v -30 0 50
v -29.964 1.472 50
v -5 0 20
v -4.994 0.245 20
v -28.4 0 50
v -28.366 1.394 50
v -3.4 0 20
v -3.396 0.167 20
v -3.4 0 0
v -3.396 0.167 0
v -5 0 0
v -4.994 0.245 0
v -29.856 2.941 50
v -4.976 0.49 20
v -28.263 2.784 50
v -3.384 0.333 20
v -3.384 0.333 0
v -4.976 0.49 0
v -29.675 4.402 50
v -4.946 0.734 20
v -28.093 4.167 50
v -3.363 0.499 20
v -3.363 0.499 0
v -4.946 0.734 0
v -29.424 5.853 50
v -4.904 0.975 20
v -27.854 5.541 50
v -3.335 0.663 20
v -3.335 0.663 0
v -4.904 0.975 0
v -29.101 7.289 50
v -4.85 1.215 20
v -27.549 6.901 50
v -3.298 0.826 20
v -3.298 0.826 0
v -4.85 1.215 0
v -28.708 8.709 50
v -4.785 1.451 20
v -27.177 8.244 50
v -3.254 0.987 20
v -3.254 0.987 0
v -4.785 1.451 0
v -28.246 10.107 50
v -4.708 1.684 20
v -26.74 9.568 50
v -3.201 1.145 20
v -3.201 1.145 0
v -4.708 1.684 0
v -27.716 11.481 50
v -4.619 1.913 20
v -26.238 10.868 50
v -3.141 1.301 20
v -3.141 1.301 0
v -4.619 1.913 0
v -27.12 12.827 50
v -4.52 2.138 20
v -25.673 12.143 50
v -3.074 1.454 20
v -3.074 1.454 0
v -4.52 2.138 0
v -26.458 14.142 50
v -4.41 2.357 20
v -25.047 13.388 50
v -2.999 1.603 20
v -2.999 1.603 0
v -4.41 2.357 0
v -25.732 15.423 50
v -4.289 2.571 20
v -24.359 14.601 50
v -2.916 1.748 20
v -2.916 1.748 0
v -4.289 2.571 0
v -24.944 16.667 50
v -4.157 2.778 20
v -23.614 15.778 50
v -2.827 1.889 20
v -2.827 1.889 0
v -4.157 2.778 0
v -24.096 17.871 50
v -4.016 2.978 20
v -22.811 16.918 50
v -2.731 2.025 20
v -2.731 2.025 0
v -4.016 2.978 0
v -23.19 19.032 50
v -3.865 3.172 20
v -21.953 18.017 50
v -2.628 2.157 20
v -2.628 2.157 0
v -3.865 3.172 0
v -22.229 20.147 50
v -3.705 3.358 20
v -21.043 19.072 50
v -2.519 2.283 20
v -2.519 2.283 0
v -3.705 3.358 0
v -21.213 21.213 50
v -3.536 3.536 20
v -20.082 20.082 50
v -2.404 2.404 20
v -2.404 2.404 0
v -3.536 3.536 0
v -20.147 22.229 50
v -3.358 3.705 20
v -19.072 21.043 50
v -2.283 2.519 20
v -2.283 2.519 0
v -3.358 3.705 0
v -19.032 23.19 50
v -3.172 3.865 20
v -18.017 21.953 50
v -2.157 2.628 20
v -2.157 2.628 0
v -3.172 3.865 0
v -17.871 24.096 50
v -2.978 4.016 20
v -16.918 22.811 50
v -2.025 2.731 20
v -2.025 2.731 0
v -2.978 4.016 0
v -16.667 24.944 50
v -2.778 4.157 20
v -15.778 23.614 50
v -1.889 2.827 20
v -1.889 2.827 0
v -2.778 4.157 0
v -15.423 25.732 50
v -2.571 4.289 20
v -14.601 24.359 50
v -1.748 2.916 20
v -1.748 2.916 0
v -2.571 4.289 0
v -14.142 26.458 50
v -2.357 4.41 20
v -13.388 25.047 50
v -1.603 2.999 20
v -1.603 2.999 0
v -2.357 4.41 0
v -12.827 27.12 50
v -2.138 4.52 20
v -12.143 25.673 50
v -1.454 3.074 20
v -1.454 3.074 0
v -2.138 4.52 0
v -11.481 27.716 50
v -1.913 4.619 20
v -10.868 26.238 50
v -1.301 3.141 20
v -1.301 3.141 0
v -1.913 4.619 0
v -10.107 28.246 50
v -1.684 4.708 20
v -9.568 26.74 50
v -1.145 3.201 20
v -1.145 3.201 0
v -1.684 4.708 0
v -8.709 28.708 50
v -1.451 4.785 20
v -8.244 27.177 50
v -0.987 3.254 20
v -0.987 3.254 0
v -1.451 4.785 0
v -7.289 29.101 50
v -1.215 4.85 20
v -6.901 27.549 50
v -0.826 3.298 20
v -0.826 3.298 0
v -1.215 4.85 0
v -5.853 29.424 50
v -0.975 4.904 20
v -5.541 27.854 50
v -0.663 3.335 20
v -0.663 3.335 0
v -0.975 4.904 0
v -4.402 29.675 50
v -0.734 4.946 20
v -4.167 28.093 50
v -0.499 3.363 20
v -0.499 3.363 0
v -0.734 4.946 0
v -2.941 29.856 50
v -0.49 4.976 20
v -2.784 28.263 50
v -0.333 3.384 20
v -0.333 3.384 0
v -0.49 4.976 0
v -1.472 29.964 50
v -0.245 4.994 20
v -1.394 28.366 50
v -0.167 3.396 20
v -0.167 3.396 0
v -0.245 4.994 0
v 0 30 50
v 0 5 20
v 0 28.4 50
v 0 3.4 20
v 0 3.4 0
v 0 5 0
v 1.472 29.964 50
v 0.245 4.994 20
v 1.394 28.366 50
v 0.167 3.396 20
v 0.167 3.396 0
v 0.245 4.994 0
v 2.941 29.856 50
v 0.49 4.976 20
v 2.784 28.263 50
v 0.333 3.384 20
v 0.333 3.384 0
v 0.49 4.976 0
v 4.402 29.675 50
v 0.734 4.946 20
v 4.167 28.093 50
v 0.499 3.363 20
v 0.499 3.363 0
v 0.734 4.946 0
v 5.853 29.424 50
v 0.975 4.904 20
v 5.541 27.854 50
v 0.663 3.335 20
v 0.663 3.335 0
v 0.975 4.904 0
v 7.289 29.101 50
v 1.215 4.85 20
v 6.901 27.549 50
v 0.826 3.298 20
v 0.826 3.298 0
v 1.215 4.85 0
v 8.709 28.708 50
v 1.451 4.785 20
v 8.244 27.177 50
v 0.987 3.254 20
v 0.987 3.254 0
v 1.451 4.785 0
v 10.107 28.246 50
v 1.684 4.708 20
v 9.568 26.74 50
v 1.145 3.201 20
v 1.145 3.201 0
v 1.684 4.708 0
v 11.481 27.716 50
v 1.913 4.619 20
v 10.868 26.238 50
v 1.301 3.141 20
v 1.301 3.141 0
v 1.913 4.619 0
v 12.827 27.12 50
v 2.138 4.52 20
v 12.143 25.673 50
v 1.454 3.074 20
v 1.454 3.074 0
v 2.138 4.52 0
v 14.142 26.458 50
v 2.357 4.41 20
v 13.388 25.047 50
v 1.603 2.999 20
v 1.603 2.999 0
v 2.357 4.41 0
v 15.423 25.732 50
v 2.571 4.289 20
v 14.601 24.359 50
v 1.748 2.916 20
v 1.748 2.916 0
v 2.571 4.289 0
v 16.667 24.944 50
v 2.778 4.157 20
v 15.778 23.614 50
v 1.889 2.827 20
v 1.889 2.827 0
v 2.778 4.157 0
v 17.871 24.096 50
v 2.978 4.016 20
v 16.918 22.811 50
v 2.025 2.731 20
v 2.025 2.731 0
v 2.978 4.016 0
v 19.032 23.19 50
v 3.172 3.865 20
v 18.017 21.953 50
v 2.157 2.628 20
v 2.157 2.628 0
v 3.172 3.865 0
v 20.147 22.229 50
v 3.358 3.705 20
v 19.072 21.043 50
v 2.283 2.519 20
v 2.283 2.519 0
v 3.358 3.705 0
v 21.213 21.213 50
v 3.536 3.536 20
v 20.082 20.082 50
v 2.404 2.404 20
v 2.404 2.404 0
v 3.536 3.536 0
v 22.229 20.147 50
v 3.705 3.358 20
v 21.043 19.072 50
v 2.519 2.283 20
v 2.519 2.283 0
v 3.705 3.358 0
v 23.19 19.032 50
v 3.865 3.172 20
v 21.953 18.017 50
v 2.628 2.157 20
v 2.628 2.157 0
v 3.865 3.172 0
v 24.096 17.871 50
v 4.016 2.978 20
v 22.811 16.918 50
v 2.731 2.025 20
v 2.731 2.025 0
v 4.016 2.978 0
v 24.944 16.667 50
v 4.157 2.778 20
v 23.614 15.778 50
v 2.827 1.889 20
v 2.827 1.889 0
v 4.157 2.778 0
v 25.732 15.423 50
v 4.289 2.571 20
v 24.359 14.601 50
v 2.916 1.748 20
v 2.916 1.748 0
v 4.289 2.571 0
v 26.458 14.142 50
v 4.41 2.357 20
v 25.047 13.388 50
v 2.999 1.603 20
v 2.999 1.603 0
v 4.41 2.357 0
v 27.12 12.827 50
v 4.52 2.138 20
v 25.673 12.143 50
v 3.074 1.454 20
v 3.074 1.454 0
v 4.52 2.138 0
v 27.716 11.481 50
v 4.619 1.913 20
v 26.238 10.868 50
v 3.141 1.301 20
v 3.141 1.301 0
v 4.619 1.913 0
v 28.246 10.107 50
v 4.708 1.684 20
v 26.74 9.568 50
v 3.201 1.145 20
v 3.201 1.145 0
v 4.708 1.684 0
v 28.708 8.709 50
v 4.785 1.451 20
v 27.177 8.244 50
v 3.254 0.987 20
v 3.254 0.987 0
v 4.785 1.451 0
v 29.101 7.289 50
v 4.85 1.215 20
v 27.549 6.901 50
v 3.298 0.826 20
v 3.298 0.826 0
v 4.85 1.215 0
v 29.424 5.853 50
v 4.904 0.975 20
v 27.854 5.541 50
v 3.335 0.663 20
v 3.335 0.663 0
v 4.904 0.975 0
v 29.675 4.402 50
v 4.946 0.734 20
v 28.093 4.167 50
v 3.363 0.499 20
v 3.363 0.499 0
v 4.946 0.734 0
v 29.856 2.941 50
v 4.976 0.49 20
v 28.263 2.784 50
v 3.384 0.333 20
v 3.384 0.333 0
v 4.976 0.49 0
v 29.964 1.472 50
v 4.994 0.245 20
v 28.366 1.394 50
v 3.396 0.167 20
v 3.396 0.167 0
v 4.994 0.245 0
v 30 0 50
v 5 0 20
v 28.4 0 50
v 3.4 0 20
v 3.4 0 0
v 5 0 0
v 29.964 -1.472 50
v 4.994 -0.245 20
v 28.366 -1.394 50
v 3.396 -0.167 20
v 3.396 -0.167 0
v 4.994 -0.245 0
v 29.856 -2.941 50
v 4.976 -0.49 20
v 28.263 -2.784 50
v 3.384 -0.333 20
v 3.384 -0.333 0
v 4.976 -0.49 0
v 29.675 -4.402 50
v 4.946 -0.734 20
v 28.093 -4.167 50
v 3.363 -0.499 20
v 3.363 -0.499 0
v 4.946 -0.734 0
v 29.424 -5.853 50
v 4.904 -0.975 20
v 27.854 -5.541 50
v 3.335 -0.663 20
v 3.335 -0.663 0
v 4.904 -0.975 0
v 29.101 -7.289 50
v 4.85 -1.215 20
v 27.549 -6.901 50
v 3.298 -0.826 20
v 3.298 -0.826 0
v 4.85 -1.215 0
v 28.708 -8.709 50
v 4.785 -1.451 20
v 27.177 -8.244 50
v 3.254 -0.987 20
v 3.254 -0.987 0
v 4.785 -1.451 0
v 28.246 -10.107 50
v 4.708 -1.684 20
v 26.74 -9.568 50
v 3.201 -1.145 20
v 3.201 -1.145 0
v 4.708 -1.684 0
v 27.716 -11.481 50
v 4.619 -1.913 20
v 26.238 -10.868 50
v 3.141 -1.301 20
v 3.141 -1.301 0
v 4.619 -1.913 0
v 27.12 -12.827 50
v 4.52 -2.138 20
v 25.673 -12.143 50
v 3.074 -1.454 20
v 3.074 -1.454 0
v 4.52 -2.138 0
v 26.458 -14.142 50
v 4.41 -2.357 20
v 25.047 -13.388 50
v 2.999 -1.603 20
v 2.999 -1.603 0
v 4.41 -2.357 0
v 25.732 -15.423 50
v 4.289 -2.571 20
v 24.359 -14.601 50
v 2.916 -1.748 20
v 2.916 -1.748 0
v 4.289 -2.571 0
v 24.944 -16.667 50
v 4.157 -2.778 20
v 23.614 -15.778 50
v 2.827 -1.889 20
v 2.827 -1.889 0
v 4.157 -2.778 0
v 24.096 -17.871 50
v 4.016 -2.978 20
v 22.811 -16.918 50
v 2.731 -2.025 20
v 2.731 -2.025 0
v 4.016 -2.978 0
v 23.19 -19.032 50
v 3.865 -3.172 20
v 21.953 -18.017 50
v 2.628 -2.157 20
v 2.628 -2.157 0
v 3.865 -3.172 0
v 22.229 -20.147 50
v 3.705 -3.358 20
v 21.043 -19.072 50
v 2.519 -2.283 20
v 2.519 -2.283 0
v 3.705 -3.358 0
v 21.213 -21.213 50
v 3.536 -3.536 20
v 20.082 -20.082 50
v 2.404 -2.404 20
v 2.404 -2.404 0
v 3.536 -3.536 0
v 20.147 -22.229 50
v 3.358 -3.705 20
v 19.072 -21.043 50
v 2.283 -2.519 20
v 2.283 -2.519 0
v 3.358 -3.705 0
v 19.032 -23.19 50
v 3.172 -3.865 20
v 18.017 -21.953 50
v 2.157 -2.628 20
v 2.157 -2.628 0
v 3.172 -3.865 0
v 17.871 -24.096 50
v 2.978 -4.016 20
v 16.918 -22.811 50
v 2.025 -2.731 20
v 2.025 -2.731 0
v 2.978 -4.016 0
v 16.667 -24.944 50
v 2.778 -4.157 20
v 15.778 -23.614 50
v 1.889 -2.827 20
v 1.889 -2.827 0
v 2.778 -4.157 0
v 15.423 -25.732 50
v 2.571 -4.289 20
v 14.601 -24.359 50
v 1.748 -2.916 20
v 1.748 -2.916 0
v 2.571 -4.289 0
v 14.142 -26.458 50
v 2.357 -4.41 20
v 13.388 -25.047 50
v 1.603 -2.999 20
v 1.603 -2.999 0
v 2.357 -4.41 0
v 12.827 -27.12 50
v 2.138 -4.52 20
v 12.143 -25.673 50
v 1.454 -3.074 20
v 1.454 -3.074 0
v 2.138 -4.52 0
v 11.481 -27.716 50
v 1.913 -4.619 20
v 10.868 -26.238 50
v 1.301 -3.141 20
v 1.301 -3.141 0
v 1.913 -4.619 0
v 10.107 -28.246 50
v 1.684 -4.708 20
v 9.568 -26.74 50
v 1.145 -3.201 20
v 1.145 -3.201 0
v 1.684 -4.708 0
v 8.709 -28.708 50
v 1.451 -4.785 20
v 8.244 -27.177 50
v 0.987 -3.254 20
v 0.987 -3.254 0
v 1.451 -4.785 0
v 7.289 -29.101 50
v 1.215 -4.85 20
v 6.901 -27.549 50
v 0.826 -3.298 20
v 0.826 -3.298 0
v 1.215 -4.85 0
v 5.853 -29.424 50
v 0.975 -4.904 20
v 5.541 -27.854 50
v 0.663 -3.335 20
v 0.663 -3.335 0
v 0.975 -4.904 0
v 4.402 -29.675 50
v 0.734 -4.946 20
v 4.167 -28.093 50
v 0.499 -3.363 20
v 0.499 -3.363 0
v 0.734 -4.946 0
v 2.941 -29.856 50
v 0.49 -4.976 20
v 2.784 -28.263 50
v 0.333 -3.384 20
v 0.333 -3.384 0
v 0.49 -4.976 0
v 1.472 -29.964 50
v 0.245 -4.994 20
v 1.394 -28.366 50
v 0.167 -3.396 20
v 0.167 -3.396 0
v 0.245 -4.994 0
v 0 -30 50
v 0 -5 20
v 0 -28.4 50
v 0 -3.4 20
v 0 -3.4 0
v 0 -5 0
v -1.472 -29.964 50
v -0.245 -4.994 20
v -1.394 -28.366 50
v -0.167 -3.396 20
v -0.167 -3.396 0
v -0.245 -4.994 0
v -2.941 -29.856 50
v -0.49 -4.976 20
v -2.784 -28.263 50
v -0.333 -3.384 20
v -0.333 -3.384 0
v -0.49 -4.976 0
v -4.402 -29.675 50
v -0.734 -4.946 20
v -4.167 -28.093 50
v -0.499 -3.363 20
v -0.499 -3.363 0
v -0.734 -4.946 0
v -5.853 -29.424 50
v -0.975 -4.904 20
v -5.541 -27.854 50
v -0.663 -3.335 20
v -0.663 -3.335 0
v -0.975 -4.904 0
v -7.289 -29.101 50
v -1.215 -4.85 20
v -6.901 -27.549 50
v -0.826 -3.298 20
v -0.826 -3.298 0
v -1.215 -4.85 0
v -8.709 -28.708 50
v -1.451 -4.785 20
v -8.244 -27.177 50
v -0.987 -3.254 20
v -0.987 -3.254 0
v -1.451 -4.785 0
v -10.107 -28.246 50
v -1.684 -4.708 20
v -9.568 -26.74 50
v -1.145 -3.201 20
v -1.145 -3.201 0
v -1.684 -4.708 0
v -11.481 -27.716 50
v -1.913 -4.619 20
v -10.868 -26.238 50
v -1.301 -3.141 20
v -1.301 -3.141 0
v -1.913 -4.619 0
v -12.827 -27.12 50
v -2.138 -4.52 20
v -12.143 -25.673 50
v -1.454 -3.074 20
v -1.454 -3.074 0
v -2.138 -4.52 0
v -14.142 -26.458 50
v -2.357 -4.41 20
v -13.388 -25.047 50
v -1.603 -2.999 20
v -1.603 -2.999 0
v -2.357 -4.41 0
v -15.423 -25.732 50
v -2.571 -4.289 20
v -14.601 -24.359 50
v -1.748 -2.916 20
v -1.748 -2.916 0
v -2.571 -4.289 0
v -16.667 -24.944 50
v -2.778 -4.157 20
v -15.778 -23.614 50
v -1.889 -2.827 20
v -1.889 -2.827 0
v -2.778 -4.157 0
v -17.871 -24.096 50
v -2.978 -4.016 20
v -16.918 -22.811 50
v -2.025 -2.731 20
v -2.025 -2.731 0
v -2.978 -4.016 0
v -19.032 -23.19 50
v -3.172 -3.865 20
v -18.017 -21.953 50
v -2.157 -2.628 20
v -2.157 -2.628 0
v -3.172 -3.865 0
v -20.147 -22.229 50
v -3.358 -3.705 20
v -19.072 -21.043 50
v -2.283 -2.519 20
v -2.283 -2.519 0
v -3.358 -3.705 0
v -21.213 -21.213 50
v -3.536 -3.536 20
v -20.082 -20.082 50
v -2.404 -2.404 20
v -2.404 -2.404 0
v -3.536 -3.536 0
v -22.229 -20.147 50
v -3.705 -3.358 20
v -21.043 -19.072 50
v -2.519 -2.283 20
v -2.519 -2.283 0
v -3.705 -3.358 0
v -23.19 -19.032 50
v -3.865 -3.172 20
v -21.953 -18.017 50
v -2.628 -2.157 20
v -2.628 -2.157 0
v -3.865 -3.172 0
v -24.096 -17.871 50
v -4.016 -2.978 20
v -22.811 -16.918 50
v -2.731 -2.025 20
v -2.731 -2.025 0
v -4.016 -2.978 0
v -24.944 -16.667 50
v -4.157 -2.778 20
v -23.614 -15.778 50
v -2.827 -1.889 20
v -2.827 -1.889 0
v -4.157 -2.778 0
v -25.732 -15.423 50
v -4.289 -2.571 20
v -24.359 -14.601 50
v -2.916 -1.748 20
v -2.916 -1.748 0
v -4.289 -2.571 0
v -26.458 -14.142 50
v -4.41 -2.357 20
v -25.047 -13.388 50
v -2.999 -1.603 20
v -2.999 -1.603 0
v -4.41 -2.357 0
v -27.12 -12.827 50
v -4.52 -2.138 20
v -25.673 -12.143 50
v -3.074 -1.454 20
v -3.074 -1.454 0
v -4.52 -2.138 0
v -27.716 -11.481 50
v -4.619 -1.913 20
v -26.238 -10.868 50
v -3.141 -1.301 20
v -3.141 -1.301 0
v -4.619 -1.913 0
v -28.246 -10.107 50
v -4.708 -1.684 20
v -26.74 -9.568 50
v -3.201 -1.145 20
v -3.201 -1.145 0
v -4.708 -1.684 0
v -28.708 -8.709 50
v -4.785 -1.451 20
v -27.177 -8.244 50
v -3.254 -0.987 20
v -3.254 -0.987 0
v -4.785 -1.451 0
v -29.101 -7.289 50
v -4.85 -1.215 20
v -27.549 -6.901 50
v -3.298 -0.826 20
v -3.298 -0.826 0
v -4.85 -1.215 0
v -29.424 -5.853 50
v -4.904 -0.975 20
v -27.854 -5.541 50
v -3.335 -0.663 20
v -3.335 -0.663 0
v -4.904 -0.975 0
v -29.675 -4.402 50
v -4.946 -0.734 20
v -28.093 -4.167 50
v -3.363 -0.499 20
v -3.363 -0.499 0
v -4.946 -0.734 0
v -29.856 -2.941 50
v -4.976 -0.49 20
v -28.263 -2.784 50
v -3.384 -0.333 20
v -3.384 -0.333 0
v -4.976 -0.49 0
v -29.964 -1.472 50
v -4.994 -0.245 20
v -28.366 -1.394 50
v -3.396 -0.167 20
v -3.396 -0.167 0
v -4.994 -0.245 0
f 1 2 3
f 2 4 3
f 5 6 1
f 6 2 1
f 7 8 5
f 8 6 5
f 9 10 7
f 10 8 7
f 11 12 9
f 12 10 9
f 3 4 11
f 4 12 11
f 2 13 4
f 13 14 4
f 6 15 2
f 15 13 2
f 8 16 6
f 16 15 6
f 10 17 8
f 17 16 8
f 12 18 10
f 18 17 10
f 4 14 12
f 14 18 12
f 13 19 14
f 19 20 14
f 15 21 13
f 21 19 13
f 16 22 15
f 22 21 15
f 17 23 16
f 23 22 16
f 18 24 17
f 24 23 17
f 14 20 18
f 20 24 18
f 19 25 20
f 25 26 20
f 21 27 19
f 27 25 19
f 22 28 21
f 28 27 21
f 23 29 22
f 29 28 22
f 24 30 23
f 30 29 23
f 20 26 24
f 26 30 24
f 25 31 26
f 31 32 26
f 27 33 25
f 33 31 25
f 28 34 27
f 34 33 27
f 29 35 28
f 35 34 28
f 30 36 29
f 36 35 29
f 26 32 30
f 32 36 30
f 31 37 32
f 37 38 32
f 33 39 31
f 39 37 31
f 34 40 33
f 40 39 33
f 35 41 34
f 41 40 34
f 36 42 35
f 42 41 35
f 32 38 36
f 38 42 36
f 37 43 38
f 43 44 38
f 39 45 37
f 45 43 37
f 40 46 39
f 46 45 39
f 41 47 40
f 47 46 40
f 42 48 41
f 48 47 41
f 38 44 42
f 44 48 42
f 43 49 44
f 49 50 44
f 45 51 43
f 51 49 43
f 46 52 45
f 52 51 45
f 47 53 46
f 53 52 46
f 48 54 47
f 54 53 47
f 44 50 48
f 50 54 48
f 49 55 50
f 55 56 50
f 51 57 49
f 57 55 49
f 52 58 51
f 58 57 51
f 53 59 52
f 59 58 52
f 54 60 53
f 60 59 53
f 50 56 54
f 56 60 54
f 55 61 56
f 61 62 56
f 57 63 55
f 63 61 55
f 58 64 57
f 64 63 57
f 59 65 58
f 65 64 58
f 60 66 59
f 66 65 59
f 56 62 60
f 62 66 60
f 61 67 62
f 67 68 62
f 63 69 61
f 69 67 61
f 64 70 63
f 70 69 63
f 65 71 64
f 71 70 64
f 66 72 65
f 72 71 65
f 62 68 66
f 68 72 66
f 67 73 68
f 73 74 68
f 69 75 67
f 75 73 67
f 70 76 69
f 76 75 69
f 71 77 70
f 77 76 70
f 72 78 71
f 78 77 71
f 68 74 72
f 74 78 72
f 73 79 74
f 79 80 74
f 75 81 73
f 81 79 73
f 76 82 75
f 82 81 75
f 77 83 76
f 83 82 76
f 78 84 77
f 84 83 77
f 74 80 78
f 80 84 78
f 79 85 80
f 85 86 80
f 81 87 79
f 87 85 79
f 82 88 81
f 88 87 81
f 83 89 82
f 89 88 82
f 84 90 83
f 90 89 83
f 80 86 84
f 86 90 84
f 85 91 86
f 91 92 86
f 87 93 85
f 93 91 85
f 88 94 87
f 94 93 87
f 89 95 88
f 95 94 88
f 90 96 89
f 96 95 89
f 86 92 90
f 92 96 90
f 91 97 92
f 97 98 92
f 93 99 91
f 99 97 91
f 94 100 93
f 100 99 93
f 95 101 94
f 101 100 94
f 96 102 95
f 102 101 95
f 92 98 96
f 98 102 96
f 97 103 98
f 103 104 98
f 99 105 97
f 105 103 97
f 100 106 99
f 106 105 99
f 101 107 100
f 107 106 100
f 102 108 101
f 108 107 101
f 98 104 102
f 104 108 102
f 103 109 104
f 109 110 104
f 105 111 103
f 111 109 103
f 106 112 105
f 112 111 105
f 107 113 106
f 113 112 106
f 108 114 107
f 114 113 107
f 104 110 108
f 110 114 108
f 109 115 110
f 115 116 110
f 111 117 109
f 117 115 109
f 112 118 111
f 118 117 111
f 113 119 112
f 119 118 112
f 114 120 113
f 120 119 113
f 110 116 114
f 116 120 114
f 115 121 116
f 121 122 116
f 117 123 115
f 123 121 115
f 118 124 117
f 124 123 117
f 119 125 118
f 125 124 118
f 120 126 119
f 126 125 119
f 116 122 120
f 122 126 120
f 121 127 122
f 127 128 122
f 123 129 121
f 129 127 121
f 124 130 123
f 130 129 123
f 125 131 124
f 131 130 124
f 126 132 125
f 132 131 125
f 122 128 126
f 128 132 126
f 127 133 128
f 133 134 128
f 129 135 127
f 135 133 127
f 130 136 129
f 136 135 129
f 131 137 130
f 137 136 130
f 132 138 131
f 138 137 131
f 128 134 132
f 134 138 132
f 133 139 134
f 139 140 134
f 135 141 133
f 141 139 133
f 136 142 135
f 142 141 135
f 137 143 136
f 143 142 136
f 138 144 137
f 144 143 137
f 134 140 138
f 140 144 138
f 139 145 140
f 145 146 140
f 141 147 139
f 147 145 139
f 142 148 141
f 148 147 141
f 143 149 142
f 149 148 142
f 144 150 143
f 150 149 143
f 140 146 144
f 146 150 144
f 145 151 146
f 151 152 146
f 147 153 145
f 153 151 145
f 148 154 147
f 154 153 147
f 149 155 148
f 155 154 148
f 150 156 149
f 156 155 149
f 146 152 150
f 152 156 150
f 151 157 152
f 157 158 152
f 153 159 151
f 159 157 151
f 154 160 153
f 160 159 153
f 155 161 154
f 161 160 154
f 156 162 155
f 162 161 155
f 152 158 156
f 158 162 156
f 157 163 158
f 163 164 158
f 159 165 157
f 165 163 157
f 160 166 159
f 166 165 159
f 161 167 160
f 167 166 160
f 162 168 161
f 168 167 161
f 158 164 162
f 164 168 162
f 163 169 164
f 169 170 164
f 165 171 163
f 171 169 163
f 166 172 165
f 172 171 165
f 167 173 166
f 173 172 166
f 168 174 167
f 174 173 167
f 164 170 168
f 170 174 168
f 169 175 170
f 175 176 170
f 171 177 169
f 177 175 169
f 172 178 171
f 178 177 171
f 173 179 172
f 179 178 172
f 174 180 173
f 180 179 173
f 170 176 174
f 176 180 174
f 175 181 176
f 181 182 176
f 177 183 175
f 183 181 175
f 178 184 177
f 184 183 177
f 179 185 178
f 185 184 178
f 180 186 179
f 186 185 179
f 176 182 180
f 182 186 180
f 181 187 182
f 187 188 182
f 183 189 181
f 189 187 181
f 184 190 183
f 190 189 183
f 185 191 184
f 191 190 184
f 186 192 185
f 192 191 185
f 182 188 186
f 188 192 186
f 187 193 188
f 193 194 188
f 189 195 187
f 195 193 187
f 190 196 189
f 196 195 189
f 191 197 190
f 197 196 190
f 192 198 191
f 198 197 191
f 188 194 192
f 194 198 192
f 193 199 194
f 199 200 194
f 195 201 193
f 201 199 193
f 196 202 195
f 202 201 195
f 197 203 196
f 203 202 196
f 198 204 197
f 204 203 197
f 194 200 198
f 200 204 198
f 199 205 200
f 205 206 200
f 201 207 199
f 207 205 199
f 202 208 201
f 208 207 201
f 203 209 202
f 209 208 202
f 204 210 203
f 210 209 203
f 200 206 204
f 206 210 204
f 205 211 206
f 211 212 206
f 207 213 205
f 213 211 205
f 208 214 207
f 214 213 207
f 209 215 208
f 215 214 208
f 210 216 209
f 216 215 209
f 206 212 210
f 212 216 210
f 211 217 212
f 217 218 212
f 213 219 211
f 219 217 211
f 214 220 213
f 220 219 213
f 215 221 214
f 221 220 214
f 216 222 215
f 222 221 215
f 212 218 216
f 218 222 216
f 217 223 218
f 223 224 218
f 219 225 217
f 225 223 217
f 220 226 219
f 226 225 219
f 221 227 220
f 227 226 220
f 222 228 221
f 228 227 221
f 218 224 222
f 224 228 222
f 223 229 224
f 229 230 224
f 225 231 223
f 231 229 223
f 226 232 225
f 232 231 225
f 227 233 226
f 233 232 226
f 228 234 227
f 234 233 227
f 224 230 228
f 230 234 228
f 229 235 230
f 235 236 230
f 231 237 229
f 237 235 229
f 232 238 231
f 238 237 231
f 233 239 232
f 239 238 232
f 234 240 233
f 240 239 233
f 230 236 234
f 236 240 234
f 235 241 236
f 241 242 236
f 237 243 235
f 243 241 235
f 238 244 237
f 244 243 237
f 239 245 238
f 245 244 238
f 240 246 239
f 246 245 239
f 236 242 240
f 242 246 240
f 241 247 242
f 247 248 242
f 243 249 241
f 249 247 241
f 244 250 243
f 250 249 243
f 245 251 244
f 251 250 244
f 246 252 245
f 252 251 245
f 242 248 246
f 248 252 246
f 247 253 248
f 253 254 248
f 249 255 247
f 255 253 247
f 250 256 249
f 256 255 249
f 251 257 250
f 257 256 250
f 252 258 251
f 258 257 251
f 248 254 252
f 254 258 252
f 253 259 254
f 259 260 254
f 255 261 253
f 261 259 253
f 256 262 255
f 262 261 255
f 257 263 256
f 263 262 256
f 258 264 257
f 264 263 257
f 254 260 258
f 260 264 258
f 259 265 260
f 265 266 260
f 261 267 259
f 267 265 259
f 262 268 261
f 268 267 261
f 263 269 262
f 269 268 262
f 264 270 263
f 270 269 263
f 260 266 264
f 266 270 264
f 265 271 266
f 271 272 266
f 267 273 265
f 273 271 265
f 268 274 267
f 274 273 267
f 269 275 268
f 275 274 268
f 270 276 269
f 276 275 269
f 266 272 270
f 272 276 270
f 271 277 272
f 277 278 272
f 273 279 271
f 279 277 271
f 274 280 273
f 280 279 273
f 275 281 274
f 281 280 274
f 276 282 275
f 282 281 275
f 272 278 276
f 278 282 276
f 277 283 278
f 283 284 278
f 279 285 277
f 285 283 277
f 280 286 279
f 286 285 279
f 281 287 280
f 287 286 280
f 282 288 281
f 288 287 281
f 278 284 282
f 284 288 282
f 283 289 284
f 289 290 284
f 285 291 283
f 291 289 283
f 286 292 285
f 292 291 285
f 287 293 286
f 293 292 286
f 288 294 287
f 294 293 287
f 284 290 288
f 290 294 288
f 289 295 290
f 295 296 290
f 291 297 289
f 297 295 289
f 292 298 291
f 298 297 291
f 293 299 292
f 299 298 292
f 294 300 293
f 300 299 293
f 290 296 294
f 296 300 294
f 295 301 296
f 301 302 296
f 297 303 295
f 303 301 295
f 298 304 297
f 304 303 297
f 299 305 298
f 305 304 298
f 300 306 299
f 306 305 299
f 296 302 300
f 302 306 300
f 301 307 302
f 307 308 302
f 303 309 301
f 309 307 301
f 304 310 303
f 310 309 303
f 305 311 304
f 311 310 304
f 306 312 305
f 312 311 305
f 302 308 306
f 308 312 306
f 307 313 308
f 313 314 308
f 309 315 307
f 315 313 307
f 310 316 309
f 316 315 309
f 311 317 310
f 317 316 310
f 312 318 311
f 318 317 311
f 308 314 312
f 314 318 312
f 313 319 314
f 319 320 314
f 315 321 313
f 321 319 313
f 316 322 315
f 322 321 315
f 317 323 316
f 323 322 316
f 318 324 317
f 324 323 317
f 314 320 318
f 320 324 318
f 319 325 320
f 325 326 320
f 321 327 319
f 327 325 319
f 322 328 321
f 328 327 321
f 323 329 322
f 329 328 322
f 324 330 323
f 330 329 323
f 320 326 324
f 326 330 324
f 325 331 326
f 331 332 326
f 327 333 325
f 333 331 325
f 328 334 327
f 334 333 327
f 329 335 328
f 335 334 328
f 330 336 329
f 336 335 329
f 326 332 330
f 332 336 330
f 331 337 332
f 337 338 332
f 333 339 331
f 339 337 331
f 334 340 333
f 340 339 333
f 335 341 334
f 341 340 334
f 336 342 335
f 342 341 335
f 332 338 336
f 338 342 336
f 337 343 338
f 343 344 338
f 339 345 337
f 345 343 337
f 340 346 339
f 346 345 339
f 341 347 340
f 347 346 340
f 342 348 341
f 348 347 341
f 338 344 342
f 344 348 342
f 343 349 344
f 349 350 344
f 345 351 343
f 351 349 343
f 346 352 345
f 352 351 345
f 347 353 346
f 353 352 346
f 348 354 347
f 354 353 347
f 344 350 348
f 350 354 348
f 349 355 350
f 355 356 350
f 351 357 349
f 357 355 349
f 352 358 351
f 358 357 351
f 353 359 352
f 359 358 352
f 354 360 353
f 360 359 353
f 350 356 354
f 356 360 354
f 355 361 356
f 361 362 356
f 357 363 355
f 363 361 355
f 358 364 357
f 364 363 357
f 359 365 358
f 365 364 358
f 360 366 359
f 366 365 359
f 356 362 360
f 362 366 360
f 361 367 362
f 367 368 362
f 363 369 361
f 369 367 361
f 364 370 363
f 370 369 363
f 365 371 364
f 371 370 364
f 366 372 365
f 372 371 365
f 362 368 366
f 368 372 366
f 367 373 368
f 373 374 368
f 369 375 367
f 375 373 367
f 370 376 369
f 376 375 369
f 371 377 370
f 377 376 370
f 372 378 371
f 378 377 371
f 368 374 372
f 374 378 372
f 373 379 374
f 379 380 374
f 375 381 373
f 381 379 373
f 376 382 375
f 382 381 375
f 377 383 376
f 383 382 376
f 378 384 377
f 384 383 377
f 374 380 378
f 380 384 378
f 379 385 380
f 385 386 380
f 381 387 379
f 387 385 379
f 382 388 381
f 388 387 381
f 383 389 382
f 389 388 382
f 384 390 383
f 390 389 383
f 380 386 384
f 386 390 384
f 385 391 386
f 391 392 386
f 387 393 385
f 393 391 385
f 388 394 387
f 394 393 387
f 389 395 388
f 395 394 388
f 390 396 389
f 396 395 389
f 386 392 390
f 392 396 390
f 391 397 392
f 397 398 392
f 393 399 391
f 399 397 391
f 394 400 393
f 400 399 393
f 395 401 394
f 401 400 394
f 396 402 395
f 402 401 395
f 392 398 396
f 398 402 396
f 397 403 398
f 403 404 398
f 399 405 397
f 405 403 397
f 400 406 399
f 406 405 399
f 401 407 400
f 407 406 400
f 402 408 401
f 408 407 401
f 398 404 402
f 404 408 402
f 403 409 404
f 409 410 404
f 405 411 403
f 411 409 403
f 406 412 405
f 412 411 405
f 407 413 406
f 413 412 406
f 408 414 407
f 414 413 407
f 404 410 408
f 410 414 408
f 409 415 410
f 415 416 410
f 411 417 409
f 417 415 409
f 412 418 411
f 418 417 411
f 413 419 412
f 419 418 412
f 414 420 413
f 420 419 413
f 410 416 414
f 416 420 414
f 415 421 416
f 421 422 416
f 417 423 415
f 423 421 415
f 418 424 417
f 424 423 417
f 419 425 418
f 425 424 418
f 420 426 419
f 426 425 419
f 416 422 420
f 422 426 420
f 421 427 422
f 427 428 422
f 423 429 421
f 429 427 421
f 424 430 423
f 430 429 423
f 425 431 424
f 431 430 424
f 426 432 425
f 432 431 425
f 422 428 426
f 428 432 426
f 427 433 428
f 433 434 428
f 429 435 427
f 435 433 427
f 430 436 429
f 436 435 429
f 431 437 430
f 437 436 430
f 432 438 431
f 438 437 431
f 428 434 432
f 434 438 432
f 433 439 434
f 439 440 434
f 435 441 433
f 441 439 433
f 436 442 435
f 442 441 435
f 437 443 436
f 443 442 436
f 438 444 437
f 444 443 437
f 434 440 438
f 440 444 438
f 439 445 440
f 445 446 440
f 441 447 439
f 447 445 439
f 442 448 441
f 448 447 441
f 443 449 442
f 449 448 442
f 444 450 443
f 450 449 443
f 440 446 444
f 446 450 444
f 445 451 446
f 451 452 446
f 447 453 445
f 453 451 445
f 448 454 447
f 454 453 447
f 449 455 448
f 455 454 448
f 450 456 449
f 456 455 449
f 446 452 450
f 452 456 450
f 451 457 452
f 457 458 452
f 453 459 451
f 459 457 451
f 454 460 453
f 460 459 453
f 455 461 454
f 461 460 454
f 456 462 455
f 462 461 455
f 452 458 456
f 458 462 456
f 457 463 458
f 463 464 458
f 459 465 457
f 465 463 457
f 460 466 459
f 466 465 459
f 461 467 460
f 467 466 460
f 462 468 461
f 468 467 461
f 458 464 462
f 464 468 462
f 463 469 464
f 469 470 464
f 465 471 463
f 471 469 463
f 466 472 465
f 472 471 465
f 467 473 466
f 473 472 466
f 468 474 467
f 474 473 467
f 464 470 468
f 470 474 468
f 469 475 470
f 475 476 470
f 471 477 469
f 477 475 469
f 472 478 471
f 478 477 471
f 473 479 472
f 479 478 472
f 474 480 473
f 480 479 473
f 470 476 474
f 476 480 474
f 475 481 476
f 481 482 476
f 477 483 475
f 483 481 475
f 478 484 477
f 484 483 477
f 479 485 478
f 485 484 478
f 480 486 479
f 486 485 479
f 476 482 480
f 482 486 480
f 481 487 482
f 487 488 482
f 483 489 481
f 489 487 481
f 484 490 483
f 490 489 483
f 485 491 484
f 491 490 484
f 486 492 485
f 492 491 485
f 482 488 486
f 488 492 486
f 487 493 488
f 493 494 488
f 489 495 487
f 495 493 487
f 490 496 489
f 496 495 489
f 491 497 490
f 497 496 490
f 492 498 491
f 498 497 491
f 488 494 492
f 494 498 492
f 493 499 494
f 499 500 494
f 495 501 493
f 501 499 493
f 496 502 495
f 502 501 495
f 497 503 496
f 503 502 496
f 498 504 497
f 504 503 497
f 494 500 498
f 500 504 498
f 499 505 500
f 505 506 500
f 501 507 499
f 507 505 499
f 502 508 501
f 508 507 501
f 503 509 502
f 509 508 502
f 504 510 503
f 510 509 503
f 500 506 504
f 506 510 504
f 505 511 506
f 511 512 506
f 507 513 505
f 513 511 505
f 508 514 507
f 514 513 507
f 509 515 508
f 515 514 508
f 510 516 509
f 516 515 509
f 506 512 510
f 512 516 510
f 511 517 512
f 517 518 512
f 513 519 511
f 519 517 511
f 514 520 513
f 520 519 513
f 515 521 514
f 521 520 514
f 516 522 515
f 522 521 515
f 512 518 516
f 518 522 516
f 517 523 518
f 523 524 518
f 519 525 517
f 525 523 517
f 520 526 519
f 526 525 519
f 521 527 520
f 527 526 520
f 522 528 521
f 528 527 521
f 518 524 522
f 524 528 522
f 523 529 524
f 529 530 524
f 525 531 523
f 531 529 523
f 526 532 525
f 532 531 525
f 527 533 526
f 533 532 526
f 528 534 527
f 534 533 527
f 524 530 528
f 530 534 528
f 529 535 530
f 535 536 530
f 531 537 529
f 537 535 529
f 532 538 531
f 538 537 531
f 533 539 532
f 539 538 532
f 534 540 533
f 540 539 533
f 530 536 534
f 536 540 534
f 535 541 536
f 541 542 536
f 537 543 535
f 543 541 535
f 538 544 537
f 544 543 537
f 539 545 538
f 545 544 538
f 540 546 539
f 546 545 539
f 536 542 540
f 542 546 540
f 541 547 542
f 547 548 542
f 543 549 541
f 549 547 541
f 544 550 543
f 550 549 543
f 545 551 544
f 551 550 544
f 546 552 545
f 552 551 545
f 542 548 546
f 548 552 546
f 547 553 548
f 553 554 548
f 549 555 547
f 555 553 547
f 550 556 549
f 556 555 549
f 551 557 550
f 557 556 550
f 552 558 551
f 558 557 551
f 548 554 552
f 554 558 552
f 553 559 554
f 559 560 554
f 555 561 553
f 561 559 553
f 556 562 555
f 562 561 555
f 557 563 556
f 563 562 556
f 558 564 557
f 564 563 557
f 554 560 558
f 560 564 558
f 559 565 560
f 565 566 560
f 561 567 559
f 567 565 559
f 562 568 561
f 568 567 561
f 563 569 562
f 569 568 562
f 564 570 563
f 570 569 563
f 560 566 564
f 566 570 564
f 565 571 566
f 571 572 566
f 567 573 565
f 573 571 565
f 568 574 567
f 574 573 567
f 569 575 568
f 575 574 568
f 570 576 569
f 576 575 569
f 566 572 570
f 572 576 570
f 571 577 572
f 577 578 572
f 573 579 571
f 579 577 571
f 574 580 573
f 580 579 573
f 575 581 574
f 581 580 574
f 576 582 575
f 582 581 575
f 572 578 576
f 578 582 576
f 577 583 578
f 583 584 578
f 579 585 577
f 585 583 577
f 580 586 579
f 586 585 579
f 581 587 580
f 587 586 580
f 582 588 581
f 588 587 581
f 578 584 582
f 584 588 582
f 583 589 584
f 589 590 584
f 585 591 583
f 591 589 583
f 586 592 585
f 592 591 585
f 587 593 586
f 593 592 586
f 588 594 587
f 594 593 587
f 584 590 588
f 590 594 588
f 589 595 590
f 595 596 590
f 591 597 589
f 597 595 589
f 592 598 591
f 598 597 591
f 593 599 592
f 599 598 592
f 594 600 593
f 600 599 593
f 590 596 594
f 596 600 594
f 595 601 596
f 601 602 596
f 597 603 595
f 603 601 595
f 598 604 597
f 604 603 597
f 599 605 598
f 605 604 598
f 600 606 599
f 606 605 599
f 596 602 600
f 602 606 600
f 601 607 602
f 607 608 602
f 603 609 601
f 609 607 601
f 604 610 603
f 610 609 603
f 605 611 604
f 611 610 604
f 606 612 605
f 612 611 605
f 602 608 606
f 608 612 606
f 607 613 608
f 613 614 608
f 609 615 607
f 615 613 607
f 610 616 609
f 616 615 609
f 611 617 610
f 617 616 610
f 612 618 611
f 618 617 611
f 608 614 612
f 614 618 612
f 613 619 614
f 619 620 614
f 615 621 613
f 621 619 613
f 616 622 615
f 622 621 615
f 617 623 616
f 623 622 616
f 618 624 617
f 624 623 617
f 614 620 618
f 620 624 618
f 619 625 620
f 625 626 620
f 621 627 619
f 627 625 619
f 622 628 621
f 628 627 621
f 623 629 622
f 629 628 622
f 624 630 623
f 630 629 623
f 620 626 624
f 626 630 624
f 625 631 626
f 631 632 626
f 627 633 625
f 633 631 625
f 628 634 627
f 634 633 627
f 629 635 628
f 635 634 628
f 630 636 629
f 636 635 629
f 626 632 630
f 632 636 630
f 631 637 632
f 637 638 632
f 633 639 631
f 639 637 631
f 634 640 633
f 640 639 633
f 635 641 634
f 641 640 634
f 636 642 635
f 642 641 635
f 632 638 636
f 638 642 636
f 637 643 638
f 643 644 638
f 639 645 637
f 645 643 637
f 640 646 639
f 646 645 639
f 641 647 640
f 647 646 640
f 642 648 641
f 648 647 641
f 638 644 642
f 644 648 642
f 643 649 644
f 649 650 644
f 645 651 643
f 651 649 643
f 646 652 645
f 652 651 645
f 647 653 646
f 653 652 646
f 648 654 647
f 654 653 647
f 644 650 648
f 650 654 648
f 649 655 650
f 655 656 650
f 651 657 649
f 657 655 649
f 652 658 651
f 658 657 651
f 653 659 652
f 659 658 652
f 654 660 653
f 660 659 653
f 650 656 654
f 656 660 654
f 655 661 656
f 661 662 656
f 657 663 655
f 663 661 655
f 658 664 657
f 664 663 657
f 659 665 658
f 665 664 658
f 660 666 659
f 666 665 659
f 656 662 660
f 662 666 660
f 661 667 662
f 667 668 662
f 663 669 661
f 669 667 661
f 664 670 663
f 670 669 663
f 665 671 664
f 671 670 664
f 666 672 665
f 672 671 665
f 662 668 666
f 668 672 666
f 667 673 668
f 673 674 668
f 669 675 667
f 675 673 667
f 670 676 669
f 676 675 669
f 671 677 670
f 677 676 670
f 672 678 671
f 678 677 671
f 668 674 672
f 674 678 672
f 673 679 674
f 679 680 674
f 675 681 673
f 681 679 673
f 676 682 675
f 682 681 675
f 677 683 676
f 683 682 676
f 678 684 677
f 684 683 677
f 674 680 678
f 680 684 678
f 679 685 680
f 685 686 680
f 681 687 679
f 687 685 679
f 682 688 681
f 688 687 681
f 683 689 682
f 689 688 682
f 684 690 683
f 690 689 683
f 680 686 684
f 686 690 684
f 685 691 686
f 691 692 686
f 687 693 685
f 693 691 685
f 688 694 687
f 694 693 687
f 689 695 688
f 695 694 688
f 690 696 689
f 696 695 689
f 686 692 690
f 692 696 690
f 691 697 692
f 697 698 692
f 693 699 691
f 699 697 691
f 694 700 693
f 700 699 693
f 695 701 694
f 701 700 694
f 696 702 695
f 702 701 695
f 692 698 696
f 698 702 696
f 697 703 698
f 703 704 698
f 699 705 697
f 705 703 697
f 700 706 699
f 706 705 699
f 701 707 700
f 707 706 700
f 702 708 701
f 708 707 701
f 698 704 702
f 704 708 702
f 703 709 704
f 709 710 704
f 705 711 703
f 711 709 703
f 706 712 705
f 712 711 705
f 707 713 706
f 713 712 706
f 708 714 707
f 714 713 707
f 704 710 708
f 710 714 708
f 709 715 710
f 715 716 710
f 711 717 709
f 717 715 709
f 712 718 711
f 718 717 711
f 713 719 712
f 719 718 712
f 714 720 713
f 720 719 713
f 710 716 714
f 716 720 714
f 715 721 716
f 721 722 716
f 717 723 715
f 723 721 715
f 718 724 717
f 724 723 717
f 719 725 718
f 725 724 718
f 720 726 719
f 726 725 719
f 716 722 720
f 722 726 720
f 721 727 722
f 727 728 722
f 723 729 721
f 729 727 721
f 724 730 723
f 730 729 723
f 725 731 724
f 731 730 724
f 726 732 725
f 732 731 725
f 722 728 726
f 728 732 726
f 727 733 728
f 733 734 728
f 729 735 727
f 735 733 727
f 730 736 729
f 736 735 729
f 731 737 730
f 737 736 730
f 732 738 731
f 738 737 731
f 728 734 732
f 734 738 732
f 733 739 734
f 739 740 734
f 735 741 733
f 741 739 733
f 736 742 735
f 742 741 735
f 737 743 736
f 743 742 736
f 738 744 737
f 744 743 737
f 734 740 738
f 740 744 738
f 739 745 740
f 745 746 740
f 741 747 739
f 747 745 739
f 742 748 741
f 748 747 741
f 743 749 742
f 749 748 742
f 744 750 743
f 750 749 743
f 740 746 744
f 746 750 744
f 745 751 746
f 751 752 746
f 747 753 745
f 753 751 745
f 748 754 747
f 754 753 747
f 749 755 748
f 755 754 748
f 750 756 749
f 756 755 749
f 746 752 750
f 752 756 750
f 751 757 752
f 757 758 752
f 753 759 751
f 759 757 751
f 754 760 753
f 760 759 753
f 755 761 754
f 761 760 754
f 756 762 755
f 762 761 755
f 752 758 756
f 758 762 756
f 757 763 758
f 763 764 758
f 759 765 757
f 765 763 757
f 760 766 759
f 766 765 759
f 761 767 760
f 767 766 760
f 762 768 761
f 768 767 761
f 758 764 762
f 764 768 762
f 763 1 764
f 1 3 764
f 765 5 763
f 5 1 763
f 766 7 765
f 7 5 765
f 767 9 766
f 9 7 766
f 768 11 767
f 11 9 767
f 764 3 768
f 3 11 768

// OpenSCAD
// Lab funnel dimensions
spout_od = 10;            // Outer diameter of straight spout
spout_bottom_z = 0;       // Z position of spout bottom
spout_top_z = 20;         // Z position where spout meets cone
cone_top_od = 10;         // Outer diameter at cone top (matches spout)
cone_bottom_od = 60;      // Outer diameter at cone rim
cone_bottom_z = 50;       // Z position of cone rim
wall_thickness = 1.6;     // Wall thickness everywhere

// Calculate radii
spout_or = spout_od / 2;
spout_ir = (spout_od - 2 * wall_thickness) / 2;
cone_or_top = cone_bottom_od / 2;
cone_ir_top = (cone_bottom_od - 2 * wall_thickness) / 2;
cone_or_bottom = spout_or;
cone_ir_bottom = spout_ir;

// Define 2D cross-section of the wall
// Traces the material from inner bottom, up inner wall, across top rim, down outer wall, across bottom rim
pts = [
  [spout_ir, spout_bottom_z],
  [spout_ir, spout_top_z],
  [cone_ir_top, cone_bottom_z],
  [cone_or_top, cone_bottom_z],
  [cone_or_bottom, spout_top_z],
  [cone_or_bottom, spout_bottom_z],
  [spout_or, spout_bottom_z]
];

// Revolve the cross-section to create the solid funnel
$fn = 128;
rotate_extrude() polygon(pts);
